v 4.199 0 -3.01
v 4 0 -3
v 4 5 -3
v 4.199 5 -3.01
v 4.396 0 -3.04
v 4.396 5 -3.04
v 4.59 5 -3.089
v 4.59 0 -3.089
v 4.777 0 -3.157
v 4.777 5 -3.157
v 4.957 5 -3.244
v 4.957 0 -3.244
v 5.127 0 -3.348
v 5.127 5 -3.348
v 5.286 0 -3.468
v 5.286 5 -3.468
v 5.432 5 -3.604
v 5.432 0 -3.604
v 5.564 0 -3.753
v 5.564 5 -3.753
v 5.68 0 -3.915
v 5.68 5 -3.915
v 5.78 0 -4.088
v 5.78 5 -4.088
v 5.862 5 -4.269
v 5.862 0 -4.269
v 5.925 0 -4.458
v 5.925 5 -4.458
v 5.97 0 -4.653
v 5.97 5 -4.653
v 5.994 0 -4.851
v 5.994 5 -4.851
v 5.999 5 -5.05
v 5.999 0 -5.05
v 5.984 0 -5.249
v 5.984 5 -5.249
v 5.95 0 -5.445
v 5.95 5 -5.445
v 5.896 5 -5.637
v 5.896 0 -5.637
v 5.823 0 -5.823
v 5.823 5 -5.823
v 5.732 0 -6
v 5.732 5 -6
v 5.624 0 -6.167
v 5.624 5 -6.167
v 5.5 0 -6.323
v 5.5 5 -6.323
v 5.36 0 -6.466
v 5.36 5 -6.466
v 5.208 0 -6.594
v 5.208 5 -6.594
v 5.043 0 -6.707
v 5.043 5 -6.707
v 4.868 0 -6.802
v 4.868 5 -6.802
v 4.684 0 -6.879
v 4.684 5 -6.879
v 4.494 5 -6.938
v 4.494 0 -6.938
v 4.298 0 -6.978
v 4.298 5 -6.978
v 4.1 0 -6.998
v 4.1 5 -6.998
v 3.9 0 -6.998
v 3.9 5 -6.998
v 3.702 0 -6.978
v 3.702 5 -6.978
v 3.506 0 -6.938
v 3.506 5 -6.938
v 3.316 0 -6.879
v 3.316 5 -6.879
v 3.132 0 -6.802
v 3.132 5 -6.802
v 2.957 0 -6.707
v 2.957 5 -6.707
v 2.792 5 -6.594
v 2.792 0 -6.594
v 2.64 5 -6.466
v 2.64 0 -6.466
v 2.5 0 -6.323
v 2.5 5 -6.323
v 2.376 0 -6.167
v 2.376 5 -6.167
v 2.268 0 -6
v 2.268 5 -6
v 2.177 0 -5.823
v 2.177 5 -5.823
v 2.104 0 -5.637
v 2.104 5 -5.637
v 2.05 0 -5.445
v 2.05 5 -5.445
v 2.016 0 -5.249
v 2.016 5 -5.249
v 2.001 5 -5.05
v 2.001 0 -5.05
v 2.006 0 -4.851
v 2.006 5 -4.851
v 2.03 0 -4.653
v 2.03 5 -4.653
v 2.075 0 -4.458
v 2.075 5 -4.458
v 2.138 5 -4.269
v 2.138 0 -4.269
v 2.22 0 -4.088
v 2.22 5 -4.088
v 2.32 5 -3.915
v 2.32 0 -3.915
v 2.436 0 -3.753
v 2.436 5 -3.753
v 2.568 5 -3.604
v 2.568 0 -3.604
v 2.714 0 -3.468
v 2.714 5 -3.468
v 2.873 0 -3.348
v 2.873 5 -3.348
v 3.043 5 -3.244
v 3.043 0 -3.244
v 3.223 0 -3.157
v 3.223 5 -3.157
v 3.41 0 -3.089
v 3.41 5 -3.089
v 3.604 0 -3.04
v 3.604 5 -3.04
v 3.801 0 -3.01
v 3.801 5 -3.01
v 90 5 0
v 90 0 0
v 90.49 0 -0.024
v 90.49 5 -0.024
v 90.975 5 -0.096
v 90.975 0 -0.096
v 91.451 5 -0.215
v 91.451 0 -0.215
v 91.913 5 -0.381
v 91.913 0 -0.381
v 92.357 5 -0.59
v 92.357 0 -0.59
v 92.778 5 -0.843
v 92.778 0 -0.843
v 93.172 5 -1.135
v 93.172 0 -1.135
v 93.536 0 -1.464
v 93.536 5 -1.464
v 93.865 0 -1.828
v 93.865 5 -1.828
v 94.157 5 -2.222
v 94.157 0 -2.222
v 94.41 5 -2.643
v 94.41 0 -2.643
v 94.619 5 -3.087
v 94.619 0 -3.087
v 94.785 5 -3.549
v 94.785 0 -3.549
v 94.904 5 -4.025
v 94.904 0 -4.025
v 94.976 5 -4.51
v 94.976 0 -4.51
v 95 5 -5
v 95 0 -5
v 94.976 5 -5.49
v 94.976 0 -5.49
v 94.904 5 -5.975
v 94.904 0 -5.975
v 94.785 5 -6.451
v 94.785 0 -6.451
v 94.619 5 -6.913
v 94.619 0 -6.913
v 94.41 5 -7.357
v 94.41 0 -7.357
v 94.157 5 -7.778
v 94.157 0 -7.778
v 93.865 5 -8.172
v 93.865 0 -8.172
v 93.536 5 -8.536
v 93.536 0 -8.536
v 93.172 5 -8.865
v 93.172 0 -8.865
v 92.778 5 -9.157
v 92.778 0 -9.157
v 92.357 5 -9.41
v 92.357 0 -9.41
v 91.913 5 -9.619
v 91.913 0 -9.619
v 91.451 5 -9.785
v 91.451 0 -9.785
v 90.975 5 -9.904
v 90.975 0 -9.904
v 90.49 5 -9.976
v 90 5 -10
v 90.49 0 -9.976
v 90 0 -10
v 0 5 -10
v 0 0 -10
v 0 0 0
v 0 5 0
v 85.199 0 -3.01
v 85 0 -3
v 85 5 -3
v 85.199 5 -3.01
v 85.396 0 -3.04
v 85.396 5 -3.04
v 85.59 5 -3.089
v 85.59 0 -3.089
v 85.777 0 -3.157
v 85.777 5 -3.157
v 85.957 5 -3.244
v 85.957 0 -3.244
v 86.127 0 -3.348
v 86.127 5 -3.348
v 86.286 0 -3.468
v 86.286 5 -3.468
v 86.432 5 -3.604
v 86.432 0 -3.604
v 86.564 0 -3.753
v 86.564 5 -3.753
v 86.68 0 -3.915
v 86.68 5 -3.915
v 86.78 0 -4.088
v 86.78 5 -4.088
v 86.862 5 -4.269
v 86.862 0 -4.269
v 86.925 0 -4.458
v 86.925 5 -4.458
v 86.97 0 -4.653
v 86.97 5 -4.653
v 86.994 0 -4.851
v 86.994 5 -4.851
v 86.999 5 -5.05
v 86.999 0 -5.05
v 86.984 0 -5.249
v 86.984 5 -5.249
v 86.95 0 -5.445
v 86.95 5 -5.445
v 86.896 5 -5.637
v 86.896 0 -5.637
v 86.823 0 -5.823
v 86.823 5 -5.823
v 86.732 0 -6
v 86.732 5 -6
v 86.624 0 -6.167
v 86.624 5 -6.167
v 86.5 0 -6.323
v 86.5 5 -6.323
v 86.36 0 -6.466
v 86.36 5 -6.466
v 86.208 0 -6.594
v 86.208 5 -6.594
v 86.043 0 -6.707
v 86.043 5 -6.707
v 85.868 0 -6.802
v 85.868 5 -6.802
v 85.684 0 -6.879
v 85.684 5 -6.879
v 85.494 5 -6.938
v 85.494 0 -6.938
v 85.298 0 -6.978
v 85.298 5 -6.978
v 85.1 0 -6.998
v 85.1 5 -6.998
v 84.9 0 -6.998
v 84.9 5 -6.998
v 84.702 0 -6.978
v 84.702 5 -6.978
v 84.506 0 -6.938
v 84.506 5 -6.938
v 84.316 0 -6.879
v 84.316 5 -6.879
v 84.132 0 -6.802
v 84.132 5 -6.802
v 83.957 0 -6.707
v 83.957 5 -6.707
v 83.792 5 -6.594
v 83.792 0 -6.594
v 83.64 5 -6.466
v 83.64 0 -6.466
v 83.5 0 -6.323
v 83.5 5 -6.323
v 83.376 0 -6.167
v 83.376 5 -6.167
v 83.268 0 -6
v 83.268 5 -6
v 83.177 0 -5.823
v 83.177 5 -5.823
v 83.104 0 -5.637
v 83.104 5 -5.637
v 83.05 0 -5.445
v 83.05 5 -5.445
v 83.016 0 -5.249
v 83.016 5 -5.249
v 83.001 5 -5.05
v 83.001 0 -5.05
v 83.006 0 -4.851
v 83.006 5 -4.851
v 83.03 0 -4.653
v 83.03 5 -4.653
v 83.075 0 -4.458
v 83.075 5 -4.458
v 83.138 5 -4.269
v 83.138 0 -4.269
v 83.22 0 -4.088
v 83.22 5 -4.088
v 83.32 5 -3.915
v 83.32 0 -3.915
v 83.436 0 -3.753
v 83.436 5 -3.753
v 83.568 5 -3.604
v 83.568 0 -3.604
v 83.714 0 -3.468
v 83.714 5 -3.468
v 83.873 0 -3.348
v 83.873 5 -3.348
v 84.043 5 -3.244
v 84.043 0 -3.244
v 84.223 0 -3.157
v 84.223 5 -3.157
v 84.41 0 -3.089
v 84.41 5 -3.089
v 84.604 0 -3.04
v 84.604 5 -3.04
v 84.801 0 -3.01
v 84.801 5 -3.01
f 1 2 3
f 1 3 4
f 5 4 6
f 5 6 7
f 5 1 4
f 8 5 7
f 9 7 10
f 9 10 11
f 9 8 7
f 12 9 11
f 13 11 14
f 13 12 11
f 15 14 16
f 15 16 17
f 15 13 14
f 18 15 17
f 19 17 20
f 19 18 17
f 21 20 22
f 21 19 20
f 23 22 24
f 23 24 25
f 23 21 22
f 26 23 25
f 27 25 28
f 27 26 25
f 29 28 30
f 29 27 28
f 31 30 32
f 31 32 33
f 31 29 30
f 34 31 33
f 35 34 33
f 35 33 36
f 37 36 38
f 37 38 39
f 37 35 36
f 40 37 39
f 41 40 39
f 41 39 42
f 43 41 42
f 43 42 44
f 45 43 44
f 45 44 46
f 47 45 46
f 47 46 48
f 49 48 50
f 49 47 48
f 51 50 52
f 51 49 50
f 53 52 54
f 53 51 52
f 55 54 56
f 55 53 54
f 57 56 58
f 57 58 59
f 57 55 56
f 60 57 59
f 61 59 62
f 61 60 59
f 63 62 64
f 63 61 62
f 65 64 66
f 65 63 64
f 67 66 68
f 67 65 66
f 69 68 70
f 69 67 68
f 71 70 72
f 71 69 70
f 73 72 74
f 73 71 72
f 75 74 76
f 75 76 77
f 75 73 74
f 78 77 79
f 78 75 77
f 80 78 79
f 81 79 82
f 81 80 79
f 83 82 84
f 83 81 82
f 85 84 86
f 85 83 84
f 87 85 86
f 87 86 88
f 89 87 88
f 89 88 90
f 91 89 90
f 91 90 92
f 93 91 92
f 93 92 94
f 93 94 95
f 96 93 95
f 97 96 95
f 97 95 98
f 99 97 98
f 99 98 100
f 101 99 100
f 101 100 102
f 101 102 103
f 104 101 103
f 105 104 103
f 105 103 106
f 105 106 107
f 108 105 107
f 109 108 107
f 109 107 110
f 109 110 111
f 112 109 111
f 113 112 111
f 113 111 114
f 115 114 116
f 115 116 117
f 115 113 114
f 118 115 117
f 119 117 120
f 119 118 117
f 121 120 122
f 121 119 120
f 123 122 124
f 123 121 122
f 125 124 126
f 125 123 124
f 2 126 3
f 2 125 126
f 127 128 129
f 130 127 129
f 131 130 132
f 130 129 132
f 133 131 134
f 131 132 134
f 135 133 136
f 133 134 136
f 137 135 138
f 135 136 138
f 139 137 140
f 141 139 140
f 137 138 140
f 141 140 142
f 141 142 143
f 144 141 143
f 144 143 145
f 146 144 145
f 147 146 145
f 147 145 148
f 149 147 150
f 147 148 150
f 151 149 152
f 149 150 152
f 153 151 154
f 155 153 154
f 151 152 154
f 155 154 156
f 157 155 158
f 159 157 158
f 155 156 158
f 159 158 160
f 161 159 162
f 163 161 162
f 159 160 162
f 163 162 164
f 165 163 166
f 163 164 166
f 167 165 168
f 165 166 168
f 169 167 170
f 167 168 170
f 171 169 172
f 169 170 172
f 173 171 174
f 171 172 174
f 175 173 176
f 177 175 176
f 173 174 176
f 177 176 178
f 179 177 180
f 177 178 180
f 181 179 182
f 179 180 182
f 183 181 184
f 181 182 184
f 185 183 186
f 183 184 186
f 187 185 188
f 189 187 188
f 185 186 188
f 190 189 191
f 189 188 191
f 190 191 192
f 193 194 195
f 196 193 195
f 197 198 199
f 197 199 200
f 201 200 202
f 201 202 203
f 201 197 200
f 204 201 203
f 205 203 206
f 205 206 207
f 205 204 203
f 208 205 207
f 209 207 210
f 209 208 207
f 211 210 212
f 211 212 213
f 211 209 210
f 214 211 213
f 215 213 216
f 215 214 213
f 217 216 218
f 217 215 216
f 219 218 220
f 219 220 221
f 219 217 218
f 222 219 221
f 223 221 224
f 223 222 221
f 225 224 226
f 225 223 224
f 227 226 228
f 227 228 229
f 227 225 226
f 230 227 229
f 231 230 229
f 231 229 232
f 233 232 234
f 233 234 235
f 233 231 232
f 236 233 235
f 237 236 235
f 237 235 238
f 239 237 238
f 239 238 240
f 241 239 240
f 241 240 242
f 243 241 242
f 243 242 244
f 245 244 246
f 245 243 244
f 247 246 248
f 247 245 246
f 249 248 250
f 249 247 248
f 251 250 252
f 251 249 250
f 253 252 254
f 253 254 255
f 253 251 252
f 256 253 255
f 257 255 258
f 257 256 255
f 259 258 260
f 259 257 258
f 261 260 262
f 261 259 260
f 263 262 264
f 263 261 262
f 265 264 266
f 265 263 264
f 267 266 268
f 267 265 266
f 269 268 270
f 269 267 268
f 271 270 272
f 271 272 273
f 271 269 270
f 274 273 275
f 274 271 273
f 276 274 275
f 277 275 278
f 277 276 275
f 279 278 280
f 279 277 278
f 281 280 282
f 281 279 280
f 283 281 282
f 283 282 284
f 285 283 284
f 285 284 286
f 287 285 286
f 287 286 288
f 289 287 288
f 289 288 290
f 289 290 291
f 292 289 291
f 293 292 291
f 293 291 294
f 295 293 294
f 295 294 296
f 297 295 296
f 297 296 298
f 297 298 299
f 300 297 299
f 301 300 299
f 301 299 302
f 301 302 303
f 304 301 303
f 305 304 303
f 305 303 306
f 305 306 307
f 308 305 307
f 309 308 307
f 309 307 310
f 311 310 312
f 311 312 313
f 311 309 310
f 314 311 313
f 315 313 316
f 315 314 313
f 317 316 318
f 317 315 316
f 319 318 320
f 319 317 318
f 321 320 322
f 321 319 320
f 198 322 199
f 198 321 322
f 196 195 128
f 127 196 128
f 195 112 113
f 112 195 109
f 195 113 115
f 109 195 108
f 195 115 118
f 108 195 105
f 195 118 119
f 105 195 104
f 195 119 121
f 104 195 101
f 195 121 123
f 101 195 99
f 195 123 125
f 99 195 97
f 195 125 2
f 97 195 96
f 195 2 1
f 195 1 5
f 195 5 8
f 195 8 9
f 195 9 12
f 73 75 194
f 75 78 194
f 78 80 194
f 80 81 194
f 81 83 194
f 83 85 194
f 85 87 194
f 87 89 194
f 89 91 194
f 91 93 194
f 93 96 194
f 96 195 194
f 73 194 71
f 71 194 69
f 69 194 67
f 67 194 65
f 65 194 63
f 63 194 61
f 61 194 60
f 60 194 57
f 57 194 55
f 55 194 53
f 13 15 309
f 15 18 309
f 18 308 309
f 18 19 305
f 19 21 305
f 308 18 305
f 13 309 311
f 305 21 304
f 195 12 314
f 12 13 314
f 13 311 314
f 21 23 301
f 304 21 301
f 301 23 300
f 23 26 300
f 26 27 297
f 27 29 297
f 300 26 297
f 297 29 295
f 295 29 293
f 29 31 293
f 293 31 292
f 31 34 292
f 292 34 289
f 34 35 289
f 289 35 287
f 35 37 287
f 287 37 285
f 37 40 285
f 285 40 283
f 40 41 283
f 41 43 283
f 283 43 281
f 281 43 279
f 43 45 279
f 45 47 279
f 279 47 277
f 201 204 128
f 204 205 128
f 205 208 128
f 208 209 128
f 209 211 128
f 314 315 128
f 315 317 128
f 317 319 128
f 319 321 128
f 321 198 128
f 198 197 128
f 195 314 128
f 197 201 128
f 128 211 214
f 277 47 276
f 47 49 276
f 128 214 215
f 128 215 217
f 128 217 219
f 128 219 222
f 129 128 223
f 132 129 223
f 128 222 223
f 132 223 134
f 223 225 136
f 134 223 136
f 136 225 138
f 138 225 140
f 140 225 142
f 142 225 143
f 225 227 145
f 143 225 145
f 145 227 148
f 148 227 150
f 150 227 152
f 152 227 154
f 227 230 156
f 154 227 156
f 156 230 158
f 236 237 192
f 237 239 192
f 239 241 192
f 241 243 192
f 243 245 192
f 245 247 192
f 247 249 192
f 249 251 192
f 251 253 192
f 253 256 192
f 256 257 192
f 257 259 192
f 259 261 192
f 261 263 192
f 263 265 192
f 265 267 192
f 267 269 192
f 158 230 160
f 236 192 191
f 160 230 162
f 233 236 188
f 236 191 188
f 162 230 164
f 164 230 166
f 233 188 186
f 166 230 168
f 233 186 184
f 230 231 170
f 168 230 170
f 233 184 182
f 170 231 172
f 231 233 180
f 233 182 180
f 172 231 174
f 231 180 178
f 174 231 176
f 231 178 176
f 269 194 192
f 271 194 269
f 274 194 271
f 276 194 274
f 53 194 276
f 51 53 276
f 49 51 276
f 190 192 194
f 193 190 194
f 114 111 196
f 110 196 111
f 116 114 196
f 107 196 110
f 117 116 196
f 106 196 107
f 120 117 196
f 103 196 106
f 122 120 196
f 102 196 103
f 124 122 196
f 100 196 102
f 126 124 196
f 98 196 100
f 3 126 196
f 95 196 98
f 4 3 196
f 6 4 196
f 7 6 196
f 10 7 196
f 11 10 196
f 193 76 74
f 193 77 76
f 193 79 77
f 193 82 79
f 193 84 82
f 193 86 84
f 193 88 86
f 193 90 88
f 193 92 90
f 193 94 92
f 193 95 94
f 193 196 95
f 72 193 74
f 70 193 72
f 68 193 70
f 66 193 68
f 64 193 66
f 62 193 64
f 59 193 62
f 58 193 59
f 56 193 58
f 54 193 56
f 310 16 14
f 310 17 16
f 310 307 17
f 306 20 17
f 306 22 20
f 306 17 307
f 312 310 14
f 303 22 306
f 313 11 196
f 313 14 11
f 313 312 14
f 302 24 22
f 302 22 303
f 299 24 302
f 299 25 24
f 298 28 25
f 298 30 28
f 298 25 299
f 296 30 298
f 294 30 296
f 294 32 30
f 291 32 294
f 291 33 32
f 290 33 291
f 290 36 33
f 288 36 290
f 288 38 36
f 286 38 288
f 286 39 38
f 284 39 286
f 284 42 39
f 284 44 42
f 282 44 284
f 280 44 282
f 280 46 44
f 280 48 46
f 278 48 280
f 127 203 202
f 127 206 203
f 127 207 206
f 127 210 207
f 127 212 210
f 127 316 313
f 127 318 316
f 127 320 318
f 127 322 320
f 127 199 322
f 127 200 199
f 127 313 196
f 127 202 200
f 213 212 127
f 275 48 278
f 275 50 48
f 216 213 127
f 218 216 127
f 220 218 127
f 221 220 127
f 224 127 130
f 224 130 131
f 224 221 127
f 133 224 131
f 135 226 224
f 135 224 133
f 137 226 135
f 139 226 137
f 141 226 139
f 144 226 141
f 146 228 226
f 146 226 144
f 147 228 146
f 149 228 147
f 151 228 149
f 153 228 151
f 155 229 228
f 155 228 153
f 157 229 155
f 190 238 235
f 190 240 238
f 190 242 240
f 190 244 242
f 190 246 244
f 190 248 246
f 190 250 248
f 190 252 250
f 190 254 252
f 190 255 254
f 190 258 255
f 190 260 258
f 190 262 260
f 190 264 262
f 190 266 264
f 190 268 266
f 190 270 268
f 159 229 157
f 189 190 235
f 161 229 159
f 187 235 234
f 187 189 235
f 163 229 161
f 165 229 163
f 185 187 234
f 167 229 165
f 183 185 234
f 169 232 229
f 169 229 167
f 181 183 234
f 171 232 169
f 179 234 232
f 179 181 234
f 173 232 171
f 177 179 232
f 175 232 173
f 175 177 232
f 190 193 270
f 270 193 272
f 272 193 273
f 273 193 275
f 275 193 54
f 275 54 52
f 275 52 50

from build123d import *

# Parameters (mm, degrees)
SKETCH1_R           = 2
BOSS_EXTRUDE1_DEPTH = 5


with BuildPart() as part:
    # Sketch1 → Boss-Extrude1 (new body)
    with BuildSketch(Plane(origin=(0, 0, 0), x_dir=(1, 0, 0), z_dir=(0, 1, 0))):
        with BuildLine():
            Line((0, 5), (0, 0))
            Line((0, 0), (90, 0))
            ThreePointArc((90, 0), (95, 5), (90, 10))
            Line((90, 10), (0, 10))
            Line((0, 10), (0, 5))
        make_face()
        with Locations(Location((4, 5, 0), (0, 0, 270))):
            Circle(SKETCH1_R, mode=Mode.SUBTRACT)
        with Locations(Location((85, 5, 0), (0, 0, 270))):
            Circle(SKETCH1_R, mode=Mode.SUBTRACT)
    extrude(amount=BOSS_EXTRUDE1_DEPTH)


solid = part.part
